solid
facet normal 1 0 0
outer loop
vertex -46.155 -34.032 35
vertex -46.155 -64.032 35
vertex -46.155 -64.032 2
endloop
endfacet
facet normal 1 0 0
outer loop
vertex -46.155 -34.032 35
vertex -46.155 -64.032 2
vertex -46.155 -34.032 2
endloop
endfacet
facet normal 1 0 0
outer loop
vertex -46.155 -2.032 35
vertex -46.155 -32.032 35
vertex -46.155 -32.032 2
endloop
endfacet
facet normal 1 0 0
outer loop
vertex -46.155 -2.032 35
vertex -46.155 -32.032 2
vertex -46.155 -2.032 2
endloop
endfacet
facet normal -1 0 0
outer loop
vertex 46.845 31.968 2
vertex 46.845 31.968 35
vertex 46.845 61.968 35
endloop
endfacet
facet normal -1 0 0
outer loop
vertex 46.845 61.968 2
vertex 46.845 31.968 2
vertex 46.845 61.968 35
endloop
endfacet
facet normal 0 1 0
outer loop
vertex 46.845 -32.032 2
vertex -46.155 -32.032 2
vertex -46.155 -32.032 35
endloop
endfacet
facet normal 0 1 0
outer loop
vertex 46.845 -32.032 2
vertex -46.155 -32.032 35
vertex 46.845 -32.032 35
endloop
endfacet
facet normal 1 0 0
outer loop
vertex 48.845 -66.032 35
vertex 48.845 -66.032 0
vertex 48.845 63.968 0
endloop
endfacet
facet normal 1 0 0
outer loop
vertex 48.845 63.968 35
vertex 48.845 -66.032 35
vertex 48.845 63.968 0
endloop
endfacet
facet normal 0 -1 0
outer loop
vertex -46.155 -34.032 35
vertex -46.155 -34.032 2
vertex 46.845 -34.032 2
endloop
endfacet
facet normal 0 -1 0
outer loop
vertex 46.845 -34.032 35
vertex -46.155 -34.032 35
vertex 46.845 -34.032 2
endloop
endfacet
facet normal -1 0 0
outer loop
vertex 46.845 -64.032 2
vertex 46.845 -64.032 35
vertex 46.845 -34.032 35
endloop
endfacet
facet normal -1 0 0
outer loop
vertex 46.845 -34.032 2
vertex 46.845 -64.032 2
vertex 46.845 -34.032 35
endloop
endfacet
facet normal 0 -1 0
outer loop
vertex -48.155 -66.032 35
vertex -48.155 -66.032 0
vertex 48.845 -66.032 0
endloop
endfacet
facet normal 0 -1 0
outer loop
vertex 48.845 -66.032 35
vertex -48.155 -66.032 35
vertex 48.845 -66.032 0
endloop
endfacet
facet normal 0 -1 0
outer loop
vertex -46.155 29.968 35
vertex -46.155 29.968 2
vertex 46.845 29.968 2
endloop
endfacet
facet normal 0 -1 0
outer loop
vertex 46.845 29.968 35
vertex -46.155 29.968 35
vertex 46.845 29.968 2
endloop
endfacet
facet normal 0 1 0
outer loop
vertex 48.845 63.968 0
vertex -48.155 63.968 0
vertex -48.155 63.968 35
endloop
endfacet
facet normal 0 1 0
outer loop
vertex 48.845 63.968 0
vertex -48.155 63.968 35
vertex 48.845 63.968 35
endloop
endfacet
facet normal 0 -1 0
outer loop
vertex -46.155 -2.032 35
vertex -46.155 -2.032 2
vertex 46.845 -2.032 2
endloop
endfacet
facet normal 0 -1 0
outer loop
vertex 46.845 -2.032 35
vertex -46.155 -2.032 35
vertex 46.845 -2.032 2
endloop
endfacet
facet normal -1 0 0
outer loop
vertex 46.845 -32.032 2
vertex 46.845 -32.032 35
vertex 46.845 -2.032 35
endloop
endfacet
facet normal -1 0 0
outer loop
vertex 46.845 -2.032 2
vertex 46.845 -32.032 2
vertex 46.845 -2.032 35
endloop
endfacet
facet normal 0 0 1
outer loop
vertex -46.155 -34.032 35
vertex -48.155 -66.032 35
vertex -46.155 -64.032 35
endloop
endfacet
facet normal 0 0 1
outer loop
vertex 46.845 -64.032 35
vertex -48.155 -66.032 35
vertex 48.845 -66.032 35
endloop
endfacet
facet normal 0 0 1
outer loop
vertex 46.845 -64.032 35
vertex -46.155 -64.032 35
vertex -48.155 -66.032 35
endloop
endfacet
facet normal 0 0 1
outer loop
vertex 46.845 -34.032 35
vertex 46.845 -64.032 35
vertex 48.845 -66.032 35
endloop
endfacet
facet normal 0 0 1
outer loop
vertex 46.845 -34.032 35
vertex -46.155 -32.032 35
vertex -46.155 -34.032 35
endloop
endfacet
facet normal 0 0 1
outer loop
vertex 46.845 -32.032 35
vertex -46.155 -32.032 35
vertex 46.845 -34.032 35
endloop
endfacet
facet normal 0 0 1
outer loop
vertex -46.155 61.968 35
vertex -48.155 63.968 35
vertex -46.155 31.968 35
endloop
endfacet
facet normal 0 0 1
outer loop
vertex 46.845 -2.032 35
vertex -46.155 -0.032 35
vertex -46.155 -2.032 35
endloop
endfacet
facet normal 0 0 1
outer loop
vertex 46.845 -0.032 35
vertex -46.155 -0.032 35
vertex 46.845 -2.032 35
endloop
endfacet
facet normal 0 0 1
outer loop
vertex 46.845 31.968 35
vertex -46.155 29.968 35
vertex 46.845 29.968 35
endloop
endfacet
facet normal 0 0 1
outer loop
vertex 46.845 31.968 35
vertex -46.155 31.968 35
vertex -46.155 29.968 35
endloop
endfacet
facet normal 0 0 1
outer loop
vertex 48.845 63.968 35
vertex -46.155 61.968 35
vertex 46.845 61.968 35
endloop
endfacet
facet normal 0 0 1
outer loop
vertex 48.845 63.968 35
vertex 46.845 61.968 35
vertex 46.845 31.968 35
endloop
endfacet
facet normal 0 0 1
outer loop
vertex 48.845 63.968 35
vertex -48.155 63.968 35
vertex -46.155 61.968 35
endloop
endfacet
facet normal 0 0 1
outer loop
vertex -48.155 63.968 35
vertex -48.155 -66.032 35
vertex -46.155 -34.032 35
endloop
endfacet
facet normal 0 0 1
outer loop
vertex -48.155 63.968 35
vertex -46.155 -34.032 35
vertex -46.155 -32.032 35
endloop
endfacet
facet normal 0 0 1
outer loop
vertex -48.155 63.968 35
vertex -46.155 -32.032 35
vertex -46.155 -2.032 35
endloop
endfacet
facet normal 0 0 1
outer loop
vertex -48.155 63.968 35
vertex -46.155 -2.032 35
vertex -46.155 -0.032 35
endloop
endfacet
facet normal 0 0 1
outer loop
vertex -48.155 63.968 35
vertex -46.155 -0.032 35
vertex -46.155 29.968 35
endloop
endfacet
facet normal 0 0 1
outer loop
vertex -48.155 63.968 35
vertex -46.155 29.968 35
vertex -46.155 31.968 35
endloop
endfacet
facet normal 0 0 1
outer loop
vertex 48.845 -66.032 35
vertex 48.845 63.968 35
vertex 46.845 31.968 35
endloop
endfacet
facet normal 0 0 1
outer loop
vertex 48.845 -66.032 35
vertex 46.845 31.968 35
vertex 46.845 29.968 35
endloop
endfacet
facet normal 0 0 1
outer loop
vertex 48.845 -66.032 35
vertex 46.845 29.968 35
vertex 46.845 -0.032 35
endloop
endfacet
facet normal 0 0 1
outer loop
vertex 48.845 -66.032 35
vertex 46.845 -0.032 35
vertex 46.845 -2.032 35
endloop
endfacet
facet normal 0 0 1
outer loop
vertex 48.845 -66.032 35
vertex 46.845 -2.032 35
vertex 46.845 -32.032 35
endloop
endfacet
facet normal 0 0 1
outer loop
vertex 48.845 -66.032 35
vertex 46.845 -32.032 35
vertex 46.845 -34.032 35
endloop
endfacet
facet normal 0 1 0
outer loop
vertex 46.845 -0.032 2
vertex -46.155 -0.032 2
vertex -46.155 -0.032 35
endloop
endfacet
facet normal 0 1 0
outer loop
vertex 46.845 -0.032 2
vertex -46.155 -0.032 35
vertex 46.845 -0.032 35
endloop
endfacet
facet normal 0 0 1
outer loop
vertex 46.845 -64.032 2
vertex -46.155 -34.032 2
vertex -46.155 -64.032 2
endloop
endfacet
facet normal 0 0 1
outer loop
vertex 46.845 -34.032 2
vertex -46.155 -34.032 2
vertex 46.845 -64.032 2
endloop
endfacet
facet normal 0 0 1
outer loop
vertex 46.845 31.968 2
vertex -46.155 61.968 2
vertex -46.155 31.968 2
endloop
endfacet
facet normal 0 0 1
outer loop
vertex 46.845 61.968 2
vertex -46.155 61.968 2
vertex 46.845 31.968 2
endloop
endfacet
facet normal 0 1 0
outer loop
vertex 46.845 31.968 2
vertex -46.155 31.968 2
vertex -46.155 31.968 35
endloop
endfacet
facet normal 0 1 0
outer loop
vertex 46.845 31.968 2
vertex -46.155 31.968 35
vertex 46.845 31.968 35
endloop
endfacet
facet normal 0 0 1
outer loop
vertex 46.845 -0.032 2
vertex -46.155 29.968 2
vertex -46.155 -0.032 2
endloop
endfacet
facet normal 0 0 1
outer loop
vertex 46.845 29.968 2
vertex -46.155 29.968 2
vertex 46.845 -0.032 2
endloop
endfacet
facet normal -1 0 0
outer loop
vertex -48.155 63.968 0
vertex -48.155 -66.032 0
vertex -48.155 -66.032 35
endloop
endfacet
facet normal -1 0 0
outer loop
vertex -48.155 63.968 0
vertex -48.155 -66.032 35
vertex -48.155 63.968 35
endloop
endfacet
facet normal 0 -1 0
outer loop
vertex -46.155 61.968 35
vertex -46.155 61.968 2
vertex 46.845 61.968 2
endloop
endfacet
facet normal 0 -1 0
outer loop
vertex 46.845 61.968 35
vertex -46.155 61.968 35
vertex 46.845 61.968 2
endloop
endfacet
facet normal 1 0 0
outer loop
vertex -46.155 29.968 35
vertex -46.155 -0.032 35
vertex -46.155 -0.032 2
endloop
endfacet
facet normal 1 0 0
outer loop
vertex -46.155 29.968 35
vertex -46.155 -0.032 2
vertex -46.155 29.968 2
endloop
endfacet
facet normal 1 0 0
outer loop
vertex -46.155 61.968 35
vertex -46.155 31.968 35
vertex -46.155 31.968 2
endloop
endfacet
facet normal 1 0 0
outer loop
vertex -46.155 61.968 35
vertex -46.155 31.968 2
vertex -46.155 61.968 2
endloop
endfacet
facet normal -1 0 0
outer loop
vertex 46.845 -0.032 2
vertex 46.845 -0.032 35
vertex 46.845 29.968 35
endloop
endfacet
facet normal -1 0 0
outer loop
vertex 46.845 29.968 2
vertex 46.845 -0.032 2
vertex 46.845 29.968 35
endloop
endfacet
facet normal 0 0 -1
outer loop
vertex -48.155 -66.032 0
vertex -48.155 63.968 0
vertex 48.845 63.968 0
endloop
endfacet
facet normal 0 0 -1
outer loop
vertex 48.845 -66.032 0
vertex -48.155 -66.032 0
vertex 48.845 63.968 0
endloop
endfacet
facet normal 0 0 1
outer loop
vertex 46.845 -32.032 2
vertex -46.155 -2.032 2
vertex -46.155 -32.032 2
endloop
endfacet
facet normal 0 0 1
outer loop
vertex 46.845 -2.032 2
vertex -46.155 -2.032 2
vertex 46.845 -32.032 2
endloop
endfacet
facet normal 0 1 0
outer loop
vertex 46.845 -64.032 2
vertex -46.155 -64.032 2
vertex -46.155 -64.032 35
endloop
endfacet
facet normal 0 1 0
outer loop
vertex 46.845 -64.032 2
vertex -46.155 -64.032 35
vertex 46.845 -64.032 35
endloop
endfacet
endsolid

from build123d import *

# Parameters (mm, degrees)
F0_W     = 97
F0_H     = 130
F0_W_2   = 93
F0_H_2   = 30
F1_DEPTH = 35
F2_DEPTH = 2


with BuildPart() as f1:
    # F0 (on Top) → F1 (new body)
    with BuildSketch(Plane.XY):
        with Locations((0.344695, -1.031602)):
            Rectangle(F0_W, F0_H)
        with Locations((0.344695, -49.031602)):
            Rectangle(F0_W_2, F0_H_2, mode=Mode.SUBTRACT)
        with Locations((0.344695, -17.031602)):
            Rectangle(F0_W_2, F0_H_2, mode=Mode.SUBTRACT)
        with Locations((0.344695, 14.968398)):
            Rectangle(F0_W_2, F0_H_2, mode=Mode.SUBTRACT)
        with Locations((0.344695, 46.968398)):
            Rectangle(F0_W_2, F0_H_2, mode=Mode.SUBTRACT)
    extrude(amount=F1_DEPTH)

    # F0 (on Top) → F2 (join)
    with BuildSketch(Plane.XY):
        with Locations((0.344695, -49.031602)):
            Rectangle(F0_W_2, F0_H_2)
        with Locations((0.344695, -17.031602)):
            Rectangle(F0_W_2, F0_H_2)
        with Locations((0.344695, 14.968398)):
            Rectangle(F0_W_2, F0_H_2)
        with Locations((0.344695, 46.968398)):
            Rectangle(F0_W_2, F0_H_2)
    extrude(amount=F2_DEPTH)


solid = f1.part
